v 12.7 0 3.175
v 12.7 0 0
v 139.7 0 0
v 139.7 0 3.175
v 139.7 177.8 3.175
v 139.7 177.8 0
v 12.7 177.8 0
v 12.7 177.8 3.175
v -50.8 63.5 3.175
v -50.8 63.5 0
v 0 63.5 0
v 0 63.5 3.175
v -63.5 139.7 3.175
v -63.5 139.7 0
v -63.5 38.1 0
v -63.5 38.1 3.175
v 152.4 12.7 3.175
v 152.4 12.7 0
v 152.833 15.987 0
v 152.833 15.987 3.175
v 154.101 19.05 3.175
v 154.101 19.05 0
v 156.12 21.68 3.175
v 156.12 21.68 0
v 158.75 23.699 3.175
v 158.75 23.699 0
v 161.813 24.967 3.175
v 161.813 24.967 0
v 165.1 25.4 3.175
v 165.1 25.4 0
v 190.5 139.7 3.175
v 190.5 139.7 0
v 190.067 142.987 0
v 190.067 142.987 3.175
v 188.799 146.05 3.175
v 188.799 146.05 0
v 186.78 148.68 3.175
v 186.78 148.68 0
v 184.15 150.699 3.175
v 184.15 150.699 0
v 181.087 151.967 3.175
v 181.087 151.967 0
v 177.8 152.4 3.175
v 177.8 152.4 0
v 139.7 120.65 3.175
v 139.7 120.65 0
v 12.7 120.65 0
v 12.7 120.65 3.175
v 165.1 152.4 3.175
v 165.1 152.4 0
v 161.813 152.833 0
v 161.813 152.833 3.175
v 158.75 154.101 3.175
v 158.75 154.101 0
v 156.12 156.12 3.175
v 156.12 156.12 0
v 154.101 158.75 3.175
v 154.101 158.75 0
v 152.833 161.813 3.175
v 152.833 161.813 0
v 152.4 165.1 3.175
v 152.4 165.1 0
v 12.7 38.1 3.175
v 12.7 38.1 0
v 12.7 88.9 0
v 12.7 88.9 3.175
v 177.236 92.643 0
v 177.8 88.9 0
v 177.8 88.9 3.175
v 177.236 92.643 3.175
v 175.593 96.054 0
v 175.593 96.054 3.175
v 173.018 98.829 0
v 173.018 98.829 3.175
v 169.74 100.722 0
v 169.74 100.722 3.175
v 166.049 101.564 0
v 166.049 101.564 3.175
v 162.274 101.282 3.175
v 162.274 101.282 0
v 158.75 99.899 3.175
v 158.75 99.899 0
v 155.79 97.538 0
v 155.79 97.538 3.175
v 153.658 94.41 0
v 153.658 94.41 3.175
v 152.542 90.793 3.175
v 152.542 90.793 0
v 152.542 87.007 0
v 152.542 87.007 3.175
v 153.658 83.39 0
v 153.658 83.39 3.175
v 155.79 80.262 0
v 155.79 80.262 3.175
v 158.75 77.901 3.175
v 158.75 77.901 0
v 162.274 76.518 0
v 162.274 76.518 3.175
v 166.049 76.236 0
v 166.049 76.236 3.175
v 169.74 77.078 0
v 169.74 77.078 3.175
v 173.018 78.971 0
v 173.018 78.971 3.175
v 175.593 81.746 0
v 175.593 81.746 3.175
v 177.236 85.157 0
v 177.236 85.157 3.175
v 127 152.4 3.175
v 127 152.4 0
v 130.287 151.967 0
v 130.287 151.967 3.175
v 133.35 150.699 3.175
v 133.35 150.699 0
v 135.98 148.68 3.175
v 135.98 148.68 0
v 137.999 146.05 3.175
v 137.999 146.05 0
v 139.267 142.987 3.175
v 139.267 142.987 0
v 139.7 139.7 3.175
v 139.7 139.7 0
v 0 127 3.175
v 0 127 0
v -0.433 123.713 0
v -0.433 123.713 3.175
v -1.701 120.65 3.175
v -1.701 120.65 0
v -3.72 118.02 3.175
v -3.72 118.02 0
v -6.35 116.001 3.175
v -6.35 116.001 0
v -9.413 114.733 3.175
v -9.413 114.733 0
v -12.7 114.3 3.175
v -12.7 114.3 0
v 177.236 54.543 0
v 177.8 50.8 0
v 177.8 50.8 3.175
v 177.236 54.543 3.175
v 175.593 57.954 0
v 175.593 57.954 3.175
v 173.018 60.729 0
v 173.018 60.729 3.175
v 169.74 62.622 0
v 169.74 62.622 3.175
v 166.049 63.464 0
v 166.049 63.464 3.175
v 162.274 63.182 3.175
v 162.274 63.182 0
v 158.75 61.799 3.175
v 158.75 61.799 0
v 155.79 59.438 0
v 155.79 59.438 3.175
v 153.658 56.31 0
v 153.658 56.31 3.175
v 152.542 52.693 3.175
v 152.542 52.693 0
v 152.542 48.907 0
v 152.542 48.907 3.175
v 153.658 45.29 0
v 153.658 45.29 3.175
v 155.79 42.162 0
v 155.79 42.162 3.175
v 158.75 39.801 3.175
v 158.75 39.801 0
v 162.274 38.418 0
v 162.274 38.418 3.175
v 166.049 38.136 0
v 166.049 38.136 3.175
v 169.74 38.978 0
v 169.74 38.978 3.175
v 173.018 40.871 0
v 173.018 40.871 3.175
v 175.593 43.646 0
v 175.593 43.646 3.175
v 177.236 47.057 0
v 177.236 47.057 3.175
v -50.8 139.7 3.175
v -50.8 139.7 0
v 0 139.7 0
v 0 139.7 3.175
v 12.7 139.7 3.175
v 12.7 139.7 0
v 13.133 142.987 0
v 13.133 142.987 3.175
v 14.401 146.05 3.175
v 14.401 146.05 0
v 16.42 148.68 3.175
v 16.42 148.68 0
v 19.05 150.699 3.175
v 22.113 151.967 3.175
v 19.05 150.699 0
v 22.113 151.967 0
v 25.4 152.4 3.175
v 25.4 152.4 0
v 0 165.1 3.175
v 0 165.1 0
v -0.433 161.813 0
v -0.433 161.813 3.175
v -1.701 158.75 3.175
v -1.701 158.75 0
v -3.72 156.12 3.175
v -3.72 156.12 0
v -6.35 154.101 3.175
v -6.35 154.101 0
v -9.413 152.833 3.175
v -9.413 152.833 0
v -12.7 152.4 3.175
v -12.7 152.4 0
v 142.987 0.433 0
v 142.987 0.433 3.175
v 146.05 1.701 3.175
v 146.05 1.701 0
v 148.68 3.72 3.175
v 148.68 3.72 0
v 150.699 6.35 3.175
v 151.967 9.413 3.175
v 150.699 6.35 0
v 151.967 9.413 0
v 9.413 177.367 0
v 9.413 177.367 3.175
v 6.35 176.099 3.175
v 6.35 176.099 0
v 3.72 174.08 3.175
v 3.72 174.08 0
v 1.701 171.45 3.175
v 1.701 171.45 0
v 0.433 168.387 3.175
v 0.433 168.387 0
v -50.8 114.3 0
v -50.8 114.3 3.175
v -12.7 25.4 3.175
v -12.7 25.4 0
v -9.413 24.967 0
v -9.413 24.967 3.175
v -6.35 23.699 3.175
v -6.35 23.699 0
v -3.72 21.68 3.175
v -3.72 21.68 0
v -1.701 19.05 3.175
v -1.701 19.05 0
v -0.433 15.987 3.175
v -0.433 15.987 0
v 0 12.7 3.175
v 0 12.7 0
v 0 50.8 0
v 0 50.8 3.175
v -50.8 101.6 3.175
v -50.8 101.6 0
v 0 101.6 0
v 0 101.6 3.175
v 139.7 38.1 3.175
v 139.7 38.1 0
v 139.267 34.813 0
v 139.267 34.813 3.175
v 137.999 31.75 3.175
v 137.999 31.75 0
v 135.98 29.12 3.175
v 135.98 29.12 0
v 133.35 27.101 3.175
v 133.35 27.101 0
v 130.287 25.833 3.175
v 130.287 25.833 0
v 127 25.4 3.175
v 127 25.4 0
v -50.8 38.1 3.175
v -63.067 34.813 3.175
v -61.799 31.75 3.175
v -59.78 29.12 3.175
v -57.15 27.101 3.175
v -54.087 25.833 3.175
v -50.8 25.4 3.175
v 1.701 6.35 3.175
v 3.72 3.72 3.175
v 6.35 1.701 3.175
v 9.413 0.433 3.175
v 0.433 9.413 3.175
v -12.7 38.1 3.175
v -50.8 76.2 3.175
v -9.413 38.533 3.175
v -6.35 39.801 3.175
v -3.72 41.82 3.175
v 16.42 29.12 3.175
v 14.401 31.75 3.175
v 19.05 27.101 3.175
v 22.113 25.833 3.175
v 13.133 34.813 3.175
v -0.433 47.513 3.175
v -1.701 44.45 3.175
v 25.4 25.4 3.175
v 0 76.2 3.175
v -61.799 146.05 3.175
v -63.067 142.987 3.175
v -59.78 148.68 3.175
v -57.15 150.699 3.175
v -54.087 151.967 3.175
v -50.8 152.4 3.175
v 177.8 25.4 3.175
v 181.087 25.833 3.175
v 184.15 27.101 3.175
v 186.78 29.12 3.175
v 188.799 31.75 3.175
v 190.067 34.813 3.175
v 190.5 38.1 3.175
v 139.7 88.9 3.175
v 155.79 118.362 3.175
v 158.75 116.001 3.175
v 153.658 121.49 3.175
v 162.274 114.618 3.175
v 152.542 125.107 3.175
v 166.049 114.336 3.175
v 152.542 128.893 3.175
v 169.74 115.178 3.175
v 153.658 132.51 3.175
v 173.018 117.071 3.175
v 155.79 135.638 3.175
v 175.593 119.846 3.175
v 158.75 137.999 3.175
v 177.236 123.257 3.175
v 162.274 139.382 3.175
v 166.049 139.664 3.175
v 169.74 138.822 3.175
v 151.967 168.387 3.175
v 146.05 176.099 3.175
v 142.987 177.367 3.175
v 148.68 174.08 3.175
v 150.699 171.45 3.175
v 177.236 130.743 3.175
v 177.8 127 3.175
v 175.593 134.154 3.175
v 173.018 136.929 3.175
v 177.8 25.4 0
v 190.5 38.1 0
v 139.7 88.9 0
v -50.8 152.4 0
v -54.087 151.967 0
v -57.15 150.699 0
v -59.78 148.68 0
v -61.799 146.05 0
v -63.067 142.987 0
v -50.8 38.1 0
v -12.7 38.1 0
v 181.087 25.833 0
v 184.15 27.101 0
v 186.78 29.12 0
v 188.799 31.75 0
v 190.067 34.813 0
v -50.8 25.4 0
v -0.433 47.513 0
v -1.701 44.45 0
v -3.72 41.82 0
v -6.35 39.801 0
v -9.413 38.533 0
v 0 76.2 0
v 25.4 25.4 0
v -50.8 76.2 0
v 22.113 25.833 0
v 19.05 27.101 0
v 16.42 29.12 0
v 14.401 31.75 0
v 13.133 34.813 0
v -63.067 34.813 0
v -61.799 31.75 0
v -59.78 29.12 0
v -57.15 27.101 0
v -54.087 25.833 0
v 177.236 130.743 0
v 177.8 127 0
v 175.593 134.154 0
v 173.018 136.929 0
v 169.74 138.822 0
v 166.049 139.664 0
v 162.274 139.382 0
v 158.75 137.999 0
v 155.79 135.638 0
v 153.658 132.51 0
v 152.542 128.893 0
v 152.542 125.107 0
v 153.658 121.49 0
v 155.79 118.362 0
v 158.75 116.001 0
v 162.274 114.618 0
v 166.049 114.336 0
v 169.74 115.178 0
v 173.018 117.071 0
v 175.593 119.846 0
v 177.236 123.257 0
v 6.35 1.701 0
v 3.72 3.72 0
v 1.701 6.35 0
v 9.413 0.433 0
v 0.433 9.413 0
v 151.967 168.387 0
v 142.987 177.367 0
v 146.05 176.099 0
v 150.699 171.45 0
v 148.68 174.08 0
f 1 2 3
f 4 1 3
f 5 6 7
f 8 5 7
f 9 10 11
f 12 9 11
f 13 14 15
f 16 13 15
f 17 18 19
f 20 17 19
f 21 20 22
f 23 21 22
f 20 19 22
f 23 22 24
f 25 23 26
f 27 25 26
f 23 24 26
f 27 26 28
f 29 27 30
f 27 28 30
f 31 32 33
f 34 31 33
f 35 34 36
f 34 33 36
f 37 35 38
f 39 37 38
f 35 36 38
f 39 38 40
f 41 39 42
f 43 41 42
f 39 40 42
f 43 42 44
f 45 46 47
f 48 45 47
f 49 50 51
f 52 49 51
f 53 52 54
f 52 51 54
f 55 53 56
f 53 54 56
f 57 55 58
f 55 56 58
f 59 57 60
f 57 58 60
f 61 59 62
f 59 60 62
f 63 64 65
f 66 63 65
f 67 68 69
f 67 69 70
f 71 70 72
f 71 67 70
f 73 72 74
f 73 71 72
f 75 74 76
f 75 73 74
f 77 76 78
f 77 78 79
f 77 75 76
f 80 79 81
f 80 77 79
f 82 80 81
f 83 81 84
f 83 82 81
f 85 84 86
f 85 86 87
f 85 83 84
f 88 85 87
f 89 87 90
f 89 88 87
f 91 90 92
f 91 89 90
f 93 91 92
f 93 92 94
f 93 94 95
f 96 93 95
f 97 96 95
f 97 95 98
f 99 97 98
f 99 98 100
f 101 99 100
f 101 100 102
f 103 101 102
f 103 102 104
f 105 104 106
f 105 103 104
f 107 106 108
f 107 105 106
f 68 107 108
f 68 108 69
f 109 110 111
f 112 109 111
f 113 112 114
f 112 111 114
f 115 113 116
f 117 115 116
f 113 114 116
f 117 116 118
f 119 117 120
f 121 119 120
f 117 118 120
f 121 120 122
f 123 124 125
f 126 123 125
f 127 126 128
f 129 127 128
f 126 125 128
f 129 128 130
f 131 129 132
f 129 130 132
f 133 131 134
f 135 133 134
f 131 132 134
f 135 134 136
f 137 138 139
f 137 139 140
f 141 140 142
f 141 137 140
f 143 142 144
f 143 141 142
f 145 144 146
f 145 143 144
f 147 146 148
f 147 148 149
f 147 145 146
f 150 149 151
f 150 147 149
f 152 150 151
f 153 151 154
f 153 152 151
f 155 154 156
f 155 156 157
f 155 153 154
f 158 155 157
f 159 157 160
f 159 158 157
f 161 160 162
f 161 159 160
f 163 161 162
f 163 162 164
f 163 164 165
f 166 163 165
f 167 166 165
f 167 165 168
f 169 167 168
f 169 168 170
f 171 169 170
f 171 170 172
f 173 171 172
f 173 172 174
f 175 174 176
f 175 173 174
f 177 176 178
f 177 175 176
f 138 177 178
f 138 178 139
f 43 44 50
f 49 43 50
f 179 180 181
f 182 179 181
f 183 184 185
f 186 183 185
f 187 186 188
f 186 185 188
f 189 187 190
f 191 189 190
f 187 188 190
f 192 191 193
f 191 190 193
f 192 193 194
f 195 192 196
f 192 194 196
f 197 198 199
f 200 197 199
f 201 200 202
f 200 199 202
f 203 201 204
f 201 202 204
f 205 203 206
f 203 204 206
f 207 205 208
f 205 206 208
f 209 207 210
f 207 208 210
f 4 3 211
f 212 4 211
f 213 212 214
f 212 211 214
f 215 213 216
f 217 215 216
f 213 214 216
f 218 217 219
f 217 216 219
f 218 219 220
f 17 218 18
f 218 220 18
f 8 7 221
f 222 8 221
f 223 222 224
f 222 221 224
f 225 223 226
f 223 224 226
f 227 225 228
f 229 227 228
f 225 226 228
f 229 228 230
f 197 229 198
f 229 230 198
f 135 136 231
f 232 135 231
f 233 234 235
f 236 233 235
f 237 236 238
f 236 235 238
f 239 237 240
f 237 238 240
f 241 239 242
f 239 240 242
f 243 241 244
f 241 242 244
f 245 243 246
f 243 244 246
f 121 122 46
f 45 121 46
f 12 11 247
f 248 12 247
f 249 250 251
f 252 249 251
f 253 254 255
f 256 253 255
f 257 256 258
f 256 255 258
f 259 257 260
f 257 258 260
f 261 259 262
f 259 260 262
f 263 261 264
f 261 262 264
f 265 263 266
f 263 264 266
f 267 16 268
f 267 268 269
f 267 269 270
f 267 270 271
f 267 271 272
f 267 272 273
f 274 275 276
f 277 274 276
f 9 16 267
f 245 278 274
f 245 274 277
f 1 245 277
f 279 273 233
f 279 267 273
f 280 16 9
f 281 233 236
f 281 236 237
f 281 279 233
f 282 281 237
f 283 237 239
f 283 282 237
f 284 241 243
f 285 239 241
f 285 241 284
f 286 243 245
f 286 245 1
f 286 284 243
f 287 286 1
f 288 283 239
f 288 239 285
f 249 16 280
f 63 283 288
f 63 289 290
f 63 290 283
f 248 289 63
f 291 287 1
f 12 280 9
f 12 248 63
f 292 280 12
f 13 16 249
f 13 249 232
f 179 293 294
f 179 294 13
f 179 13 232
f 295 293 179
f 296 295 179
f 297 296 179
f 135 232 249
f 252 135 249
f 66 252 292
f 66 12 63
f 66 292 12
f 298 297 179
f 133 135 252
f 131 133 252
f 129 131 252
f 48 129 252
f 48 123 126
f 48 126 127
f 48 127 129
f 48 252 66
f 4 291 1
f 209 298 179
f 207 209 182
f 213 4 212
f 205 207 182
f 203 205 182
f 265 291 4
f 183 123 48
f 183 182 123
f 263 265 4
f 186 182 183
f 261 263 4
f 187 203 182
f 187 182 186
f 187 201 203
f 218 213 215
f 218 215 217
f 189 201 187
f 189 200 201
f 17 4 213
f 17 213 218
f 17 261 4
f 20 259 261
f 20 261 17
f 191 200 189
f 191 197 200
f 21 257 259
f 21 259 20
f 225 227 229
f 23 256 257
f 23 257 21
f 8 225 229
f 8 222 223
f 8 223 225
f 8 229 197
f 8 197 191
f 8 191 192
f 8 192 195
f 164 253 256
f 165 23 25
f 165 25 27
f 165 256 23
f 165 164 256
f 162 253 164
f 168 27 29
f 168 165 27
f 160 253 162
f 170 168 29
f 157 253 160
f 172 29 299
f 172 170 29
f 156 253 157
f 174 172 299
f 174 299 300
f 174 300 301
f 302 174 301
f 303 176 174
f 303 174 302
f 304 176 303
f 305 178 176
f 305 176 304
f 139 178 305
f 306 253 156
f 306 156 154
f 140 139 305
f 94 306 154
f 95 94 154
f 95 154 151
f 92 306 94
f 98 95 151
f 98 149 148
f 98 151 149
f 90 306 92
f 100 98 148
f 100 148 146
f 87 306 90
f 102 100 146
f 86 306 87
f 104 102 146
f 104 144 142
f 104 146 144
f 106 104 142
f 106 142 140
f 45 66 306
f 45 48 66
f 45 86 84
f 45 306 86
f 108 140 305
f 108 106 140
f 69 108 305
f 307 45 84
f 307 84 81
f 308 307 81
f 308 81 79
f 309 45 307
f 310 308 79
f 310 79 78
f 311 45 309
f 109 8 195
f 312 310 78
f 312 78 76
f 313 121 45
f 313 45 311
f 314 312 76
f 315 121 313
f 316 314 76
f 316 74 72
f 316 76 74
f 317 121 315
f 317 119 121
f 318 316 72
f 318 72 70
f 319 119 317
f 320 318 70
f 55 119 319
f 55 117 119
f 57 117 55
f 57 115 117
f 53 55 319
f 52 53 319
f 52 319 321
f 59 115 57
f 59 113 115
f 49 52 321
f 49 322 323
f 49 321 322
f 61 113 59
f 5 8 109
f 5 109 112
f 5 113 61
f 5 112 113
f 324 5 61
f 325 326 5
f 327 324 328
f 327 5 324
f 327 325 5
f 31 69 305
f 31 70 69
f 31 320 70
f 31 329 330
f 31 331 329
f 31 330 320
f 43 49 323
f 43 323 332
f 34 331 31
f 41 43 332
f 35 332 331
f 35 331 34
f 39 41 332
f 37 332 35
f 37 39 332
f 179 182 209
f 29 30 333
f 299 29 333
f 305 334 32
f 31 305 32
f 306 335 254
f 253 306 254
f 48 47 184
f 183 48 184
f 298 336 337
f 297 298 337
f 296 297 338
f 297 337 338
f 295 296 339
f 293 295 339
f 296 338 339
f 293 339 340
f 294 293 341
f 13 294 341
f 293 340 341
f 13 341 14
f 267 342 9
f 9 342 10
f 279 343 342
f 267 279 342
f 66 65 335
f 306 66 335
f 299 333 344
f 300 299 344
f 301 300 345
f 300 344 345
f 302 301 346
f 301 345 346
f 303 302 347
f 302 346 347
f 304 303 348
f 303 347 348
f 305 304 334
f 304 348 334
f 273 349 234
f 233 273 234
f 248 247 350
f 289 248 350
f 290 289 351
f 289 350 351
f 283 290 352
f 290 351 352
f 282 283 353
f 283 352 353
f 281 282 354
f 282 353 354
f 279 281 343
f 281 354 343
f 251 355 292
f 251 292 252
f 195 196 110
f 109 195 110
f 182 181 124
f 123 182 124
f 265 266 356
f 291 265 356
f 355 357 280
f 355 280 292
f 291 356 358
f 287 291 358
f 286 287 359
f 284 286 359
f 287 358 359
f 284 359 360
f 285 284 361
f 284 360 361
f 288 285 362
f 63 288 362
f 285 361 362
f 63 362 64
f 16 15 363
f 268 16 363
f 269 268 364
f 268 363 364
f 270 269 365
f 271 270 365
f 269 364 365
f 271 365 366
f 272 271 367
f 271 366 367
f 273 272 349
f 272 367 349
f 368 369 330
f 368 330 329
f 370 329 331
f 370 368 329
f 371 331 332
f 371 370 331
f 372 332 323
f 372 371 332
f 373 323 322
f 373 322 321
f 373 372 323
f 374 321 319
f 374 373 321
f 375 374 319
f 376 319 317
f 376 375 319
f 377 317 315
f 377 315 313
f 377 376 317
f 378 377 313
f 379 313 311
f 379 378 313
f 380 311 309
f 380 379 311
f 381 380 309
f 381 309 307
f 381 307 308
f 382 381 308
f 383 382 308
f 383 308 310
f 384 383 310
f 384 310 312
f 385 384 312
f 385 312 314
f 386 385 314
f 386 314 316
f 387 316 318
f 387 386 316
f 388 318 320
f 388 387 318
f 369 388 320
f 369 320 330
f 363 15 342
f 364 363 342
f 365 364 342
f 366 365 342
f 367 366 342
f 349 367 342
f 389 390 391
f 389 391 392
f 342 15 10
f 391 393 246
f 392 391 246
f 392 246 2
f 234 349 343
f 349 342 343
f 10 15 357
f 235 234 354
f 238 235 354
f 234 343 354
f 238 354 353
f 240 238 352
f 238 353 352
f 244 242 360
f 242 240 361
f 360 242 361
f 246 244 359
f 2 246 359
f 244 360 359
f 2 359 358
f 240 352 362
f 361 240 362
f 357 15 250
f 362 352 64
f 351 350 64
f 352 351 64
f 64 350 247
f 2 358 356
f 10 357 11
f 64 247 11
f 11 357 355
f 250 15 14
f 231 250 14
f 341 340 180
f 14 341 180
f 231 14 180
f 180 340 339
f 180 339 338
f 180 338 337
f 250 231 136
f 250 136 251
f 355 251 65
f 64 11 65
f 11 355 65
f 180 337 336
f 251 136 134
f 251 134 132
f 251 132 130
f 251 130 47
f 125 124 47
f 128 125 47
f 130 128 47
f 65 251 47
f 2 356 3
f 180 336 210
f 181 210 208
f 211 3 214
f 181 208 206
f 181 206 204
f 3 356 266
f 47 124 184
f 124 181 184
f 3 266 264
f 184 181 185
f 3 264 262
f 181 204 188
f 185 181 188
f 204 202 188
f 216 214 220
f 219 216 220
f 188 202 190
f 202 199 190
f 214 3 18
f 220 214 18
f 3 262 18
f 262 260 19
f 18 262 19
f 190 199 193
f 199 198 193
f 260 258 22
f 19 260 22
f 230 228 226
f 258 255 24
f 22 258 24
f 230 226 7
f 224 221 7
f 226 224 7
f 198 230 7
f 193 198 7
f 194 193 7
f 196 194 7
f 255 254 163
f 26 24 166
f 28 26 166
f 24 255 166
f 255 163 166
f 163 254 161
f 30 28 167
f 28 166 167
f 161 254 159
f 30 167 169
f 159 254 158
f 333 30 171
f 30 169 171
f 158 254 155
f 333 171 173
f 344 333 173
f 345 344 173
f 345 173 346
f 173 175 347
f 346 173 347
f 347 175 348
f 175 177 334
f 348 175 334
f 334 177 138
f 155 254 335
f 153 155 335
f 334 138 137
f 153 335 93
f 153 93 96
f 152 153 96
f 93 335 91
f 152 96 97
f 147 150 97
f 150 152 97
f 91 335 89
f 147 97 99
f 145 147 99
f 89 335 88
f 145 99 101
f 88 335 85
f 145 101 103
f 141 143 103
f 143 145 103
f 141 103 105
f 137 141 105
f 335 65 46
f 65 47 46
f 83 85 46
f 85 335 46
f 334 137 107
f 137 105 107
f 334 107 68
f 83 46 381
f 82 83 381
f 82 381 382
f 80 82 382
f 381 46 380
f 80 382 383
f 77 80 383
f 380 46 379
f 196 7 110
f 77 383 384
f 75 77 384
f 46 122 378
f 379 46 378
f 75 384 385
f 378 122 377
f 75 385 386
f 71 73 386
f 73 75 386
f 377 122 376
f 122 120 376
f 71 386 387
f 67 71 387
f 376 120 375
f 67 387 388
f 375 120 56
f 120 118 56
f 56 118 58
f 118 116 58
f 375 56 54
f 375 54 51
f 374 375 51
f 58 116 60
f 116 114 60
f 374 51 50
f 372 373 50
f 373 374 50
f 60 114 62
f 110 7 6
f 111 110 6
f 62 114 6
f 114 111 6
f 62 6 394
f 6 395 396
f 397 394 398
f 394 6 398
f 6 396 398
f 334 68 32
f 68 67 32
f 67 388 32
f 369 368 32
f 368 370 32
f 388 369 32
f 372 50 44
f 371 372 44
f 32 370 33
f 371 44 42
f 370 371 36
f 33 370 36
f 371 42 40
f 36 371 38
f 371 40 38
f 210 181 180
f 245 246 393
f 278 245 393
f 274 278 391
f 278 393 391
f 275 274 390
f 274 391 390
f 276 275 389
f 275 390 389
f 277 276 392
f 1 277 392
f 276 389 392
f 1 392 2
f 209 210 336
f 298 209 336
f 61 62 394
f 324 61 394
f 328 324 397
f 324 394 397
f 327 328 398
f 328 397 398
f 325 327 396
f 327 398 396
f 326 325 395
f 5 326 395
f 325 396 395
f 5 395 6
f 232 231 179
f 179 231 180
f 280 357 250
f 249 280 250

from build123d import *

# Parameters (mm, degrees)
F0_W     = 50.8
F0_H     = 25.4
F0_R     = 12.7
F1_DEPTH = 3.175


with BuildPart() as f1:
    # F0 (on Top) → F1 (new body)
    with BuildSketch(Plane.XY):
        with BuildLine():
            Line((-50.8, 25.4), (-12.7, 25.4))
            ThreePointArc((-12.7, 25.4), (-3.719744, 21.680256), (0, 12.7))
            ThreePointArc((0, 12.7), (3.719744, 3.719744), (12.7, 0))
            Line((12.7, 0), (139.7, 0))
            ThreePointArc((139.7, 0), (148.680256, 3.719744), (152.4, 12.7))
            ThreePointArc((152.4, 12.7), (156.119744, 21.680256), (165.1, 25.4))
            Line((165.1, 25.4), (177.8, 25.4))
            ThreePointArc((177.8, 25.4), (186.780256, 29.119744), (190.5, 38.1))
            Line((190.5, 38.1), (190.5, 139.7))
            ThreePointArc((190.5, 139.7), (186.780256, 148.680256), (177.8, 152.4))
            Line((177.8, 152.4), (165.1, 152.4))
            ThreePointArc((165.1, 152.4), (156.119744, 156.119744), (152.4, 165.1))
            ThreePointArc((152.4, 165.1), (148.680256, 174.080256), (139.7, 177.8))
            Line((139.7, 177.8), (12.7, 177.8))
            ThreePointArc((12.7, 177.8), (3.719744, 174.080256), (0, 165.1))
            ThreePointArc((0, 165.1), (-3.719744, 156.119744), (-12.7, 152.4))
            Line((-12.7, 152.4), (-50.8, 152.4))
            ThreePointArc((-50.8, 152.4), (-59.780256, 148.680256), (-63.5, 139.7))
            Line((-63.5, 139.7), (-63.5, 38.1))
            ThreePointArc((-63.5, 38.1), (-59.780256, 29.119744), (-50.8, 25.4))
        make_face()
        with BuildLine():
            Line((-12.7, 38.1), (-50.8, 38.1))
            Line((-50.8, 38.1), (-50.8, 63.5))
            Line((-50.8, 63.5), (0, 63.5))
            Line((0, 63.5), (0, 50.8))
            ThreePointArc((0, 50.8), (-3.719744, 41.819744), (-12.7, 38.1))
        make_face(mode=Mode.SUBTRACT)
        with Locations((-25.4, 88.9)):
            Rectangle(F0_W, F0_H, mode=Mode.SUBTRACT)
        with BuildLine():
            Line((12.7, 38.1), (12.7, 88.9))
            Line((12.7, 88.9), (139.7, 88.9))
            Line((139.7, 88.9), (139.7, 38.1))
            ThreePointArc((139.7, 38.1), (135.980256, 29.119744), (127, 25.4))
            Line((127, 25.4), (25.4, 25.4))
            ThreePointArc((25.4, 25.4), (16.419744, 29.119744), (12.7, 38.1))
        make_face(mode=Mode.SUBTRACT)
        with Locations((165.1, 50.8)):
            Circle(F0_R, mode=Mode.SUBTRACT)
        with Locations((165.1, 88.9)):
            Circle(F0_R, mode=Mode.SUBTRACT)
        with BuildLine():
            Line((-50.8, 114.3), (-50.8, 139.7))
            Line((-50.8, 139.7), (0, 139.7))
            Line((0, 139.7), (0, 127))
            ThreePointArc((0, 127), (-3.719744, 118.019744), (-12.7, 114.3))
            Line((-12.7, 114.3), (-50.8, 114.3))
        make_face(mode=Mode.SUBTRACT)
        with Locations((165.1, 127)):
            Circle(F0_R, mode=Mode.SUBTRACT)
        with BuildLine():
            ThreePointArc((12.7, 139.7), (16.419744, 148.680256), (25.4, 152.4))
            Line((25.4, 152.4), (127, 152.4))
            ThreePointArc((127, 152.4), (135.980256, 148.680256), (139.7, 139.7))
            Line((139.7, 139.7), (139.7, 120.65))
            Line((139.7, 120.65), (12.7, 120.65))
            Line((12.7, 120.65), (12.7, 139.7))
        make_face(mode=Mode.SUBTRACT)
    extrude(amount=F1_DEPTH)


solid = f1.part
